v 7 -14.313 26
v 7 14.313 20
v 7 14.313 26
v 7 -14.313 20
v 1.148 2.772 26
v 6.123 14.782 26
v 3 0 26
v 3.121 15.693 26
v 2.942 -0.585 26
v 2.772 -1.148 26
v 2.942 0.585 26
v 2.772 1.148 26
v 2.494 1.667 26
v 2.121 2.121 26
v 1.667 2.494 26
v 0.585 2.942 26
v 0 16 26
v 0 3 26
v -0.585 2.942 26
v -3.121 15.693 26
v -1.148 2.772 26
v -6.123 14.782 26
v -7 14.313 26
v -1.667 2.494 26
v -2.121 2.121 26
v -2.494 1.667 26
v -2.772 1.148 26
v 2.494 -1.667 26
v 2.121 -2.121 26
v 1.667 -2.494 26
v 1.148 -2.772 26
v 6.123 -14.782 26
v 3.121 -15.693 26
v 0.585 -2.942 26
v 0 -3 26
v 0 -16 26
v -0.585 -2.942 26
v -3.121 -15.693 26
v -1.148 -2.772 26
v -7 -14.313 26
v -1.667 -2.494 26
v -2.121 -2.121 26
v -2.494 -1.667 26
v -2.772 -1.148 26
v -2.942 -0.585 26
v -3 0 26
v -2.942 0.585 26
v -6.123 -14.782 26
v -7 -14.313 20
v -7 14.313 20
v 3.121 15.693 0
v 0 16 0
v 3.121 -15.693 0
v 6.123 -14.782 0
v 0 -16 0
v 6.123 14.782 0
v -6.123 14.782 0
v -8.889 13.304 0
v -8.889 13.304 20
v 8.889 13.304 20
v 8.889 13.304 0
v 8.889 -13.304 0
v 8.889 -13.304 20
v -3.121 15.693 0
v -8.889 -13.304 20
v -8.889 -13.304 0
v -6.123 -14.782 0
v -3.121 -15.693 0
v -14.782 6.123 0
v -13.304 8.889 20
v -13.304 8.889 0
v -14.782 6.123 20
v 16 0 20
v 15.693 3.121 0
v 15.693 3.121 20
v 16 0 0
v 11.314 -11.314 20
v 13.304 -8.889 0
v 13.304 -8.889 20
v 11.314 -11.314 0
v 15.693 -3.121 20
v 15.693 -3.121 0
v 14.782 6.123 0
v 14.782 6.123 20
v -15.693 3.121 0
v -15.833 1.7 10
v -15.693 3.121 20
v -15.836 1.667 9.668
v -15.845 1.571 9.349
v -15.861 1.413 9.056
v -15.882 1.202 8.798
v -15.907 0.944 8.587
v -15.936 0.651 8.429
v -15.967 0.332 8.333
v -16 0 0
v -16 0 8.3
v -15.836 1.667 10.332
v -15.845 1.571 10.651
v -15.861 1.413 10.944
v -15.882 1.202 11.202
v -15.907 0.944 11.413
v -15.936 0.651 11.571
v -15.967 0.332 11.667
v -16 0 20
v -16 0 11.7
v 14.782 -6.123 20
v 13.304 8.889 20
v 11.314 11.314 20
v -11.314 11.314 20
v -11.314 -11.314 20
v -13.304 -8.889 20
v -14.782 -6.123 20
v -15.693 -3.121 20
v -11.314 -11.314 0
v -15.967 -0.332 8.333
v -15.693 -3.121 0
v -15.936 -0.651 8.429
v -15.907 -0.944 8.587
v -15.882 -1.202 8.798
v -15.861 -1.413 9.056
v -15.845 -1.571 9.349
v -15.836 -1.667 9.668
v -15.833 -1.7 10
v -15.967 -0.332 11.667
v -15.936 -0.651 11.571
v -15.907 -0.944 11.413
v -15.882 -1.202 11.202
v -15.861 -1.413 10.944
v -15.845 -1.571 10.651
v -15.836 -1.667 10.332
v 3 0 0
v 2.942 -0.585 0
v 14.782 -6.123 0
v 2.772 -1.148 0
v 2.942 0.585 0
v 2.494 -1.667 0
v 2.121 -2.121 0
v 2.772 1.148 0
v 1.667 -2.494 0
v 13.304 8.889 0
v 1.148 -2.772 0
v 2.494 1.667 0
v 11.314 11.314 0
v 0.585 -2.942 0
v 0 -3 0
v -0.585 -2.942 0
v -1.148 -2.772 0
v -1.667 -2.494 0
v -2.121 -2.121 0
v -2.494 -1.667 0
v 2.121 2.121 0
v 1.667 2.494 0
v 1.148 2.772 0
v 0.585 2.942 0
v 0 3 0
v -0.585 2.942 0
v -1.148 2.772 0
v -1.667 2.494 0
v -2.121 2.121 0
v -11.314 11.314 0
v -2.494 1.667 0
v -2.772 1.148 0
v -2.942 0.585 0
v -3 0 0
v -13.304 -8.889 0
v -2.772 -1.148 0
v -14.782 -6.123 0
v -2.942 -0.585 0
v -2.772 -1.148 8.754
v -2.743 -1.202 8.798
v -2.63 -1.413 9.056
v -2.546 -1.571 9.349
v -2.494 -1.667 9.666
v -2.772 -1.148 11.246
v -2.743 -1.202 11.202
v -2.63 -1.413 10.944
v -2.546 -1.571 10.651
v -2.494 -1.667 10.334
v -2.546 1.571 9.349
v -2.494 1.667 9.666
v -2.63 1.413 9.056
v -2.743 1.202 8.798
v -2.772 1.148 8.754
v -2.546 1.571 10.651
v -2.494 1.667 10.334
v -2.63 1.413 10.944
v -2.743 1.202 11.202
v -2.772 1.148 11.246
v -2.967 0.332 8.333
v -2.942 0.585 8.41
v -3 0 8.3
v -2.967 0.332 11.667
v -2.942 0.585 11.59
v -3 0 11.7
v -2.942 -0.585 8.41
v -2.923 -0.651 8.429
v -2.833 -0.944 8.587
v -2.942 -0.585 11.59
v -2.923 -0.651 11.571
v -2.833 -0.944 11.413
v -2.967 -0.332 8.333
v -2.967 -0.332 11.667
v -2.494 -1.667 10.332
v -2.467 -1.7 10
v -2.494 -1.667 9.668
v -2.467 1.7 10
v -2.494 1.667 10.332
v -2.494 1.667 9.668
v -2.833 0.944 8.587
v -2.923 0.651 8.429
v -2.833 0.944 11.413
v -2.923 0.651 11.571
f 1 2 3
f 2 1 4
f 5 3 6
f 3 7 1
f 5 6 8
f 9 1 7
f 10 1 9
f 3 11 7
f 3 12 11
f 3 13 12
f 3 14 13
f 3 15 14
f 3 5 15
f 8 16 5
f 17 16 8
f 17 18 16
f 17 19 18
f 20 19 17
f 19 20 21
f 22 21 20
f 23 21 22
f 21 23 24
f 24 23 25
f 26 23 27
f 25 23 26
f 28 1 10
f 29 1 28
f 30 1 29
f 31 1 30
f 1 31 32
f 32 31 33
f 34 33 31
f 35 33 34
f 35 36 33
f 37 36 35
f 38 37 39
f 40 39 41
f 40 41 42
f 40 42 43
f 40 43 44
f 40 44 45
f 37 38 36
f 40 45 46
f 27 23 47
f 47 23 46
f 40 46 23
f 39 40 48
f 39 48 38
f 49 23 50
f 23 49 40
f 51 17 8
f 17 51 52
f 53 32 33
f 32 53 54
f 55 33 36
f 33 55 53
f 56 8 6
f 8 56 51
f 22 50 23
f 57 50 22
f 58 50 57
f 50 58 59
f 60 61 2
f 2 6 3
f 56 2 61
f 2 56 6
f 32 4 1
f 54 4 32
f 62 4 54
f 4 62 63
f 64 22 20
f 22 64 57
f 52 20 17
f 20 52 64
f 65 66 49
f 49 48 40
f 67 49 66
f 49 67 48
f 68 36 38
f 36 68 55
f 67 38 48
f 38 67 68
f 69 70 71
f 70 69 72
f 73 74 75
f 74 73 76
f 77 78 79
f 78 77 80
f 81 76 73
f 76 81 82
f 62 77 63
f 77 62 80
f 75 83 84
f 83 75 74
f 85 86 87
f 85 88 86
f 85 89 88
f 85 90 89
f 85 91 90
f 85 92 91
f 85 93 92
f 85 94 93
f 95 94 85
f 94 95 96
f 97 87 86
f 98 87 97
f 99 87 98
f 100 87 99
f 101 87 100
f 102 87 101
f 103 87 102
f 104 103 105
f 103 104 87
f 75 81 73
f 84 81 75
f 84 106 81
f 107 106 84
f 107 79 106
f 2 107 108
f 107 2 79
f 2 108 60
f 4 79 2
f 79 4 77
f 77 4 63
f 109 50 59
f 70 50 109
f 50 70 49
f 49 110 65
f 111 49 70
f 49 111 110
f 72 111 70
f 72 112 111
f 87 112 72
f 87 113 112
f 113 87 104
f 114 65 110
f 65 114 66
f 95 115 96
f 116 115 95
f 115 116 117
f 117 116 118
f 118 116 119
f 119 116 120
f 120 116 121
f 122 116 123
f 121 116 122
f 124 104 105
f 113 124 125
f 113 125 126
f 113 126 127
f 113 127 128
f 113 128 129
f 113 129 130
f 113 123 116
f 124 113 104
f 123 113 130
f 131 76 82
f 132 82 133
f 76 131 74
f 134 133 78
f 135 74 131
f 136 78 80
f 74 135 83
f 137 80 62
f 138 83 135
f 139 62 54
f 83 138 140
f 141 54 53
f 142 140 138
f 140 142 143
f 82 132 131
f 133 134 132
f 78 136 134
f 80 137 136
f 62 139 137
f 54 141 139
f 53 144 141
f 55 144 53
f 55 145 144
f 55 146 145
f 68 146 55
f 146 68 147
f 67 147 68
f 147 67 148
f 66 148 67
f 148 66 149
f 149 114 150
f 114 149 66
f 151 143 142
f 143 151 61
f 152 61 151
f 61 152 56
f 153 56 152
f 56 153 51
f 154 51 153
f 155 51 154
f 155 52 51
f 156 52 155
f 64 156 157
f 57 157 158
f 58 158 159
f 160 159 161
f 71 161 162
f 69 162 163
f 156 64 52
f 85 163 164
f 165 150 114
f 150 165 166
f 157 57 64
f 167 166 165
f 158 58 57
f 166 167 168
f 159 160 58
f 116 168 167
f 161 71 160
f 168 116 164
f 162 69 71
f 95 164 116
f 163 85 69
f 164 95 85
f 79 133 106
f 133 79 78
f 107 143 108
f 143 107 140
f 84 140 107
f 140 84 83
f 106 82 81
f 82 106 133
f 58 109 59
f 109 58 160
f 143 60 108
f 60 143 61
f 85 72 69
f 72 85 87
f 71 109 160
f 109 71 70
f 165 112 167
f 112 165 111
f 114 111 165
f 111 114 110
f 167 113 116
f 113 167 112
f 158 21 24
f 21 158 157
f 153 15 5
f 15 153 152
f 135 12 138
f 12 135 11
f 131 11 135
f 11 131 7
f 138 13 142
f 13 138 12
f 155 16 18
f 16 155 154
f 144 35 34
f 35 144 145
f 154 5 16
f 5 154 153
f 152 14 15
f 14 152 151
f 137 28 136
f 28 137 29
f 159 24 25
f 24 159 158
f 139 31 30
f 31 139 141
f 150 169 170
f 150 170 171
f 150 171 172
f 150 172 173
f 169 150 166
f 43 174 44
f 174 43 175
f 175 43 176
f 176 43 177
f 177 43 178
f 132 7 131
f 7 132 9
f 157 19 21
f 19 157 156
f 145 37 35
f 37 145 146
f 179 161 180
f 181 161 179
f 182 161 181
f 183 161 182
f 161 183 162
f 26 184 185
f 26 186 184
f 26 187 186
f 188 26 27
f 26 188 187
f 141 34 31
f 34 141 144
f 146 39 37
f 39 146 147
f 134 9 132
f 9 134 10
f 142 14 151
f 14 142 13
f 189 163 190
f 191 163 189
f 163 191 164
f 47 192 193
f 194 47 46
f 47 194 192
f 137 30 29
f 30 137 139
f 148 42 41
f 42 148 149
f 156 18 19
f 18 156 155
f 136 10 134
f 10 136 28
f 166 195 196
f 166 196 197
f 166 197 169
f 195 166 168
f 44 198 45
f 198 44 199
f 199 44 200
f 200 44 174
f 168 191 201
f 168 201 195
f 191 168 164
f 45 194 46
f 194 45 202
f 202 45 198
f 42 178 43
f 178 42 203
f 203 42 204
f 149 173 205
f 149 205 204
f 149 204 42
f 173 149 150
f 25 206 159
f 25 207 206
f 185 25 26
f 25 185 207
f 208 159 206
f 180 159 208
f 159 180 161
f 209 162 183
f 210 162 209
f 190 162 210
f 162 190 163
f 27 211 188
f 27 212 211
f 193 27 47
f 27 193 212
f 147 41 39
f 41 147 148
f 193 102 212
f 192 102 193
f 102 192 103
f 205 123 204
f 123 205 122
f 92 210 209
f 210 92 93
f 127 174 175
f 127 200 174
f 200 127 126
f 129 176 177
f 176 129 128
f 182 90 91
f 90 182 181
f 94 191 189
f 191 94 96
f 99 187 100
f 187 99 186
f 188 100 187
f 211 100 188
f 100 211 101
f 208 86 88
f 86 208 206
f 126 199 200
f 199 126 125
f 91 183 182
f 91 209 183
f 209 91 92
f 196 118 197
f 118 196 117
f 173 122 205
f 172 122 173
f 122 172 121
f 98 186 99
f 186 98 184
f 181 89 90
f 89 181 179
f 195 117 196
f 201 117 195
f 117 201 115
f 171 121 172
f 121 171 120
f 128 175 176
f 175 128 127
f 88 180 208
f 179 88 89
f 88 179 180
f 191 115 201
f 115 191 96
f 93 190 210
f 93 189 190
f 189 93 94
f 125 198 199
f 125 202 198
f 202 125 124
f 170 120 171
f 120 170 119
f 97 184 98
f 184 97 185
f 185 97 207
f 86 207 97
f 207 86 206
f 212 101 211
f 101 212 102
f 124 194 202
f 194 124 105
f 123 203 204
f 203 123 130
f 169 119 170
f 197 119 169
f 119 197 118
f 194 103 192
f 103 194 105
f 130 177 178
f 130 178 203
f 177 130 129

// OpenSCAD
$fn = 32;

// ----------------------------------------------------------------------
// Oldham coupling hub: 32 x 26 mm
// ----------------------------------------------------------------------

// --- parameters (mm) ---
flange_dia = 32;          // hub diameter
flange_len = 20;          // hub length
hub_bore = 6;             // shaft bore
key_w = 14;               // drive tongue width
tongue_h = 6;             // drive tongue height
set_d = 3.4;              // set screw tap hole

module hub() {
  cylinder(h = flange_len, d = flange_dia);
  /* tongue, clipped to the hub disc and sunk 1 mm into the face */
  intersection() {
    translate([-key_w / 2, -flange_dia / 2, flange_len - 1])
      cube([key_w, flange_dia, tongue_h + 1]);
    translate([0, 0, flange_len - 1]) cylinder(h = tongue_h + 1, d = flange_dia);
  }
}

difference() {
  hub();
  translate([0, 0, -1]) cylinder(h = flange_len + tongue_h + 2, d = hub_bore);
  translate([-flange_dia / 2 - 1, 0, flange_len * 0.5])
    rotate([0, 90, 0]) cylinder(h = flange_dia / 2 + 2, d = set_d);
}
